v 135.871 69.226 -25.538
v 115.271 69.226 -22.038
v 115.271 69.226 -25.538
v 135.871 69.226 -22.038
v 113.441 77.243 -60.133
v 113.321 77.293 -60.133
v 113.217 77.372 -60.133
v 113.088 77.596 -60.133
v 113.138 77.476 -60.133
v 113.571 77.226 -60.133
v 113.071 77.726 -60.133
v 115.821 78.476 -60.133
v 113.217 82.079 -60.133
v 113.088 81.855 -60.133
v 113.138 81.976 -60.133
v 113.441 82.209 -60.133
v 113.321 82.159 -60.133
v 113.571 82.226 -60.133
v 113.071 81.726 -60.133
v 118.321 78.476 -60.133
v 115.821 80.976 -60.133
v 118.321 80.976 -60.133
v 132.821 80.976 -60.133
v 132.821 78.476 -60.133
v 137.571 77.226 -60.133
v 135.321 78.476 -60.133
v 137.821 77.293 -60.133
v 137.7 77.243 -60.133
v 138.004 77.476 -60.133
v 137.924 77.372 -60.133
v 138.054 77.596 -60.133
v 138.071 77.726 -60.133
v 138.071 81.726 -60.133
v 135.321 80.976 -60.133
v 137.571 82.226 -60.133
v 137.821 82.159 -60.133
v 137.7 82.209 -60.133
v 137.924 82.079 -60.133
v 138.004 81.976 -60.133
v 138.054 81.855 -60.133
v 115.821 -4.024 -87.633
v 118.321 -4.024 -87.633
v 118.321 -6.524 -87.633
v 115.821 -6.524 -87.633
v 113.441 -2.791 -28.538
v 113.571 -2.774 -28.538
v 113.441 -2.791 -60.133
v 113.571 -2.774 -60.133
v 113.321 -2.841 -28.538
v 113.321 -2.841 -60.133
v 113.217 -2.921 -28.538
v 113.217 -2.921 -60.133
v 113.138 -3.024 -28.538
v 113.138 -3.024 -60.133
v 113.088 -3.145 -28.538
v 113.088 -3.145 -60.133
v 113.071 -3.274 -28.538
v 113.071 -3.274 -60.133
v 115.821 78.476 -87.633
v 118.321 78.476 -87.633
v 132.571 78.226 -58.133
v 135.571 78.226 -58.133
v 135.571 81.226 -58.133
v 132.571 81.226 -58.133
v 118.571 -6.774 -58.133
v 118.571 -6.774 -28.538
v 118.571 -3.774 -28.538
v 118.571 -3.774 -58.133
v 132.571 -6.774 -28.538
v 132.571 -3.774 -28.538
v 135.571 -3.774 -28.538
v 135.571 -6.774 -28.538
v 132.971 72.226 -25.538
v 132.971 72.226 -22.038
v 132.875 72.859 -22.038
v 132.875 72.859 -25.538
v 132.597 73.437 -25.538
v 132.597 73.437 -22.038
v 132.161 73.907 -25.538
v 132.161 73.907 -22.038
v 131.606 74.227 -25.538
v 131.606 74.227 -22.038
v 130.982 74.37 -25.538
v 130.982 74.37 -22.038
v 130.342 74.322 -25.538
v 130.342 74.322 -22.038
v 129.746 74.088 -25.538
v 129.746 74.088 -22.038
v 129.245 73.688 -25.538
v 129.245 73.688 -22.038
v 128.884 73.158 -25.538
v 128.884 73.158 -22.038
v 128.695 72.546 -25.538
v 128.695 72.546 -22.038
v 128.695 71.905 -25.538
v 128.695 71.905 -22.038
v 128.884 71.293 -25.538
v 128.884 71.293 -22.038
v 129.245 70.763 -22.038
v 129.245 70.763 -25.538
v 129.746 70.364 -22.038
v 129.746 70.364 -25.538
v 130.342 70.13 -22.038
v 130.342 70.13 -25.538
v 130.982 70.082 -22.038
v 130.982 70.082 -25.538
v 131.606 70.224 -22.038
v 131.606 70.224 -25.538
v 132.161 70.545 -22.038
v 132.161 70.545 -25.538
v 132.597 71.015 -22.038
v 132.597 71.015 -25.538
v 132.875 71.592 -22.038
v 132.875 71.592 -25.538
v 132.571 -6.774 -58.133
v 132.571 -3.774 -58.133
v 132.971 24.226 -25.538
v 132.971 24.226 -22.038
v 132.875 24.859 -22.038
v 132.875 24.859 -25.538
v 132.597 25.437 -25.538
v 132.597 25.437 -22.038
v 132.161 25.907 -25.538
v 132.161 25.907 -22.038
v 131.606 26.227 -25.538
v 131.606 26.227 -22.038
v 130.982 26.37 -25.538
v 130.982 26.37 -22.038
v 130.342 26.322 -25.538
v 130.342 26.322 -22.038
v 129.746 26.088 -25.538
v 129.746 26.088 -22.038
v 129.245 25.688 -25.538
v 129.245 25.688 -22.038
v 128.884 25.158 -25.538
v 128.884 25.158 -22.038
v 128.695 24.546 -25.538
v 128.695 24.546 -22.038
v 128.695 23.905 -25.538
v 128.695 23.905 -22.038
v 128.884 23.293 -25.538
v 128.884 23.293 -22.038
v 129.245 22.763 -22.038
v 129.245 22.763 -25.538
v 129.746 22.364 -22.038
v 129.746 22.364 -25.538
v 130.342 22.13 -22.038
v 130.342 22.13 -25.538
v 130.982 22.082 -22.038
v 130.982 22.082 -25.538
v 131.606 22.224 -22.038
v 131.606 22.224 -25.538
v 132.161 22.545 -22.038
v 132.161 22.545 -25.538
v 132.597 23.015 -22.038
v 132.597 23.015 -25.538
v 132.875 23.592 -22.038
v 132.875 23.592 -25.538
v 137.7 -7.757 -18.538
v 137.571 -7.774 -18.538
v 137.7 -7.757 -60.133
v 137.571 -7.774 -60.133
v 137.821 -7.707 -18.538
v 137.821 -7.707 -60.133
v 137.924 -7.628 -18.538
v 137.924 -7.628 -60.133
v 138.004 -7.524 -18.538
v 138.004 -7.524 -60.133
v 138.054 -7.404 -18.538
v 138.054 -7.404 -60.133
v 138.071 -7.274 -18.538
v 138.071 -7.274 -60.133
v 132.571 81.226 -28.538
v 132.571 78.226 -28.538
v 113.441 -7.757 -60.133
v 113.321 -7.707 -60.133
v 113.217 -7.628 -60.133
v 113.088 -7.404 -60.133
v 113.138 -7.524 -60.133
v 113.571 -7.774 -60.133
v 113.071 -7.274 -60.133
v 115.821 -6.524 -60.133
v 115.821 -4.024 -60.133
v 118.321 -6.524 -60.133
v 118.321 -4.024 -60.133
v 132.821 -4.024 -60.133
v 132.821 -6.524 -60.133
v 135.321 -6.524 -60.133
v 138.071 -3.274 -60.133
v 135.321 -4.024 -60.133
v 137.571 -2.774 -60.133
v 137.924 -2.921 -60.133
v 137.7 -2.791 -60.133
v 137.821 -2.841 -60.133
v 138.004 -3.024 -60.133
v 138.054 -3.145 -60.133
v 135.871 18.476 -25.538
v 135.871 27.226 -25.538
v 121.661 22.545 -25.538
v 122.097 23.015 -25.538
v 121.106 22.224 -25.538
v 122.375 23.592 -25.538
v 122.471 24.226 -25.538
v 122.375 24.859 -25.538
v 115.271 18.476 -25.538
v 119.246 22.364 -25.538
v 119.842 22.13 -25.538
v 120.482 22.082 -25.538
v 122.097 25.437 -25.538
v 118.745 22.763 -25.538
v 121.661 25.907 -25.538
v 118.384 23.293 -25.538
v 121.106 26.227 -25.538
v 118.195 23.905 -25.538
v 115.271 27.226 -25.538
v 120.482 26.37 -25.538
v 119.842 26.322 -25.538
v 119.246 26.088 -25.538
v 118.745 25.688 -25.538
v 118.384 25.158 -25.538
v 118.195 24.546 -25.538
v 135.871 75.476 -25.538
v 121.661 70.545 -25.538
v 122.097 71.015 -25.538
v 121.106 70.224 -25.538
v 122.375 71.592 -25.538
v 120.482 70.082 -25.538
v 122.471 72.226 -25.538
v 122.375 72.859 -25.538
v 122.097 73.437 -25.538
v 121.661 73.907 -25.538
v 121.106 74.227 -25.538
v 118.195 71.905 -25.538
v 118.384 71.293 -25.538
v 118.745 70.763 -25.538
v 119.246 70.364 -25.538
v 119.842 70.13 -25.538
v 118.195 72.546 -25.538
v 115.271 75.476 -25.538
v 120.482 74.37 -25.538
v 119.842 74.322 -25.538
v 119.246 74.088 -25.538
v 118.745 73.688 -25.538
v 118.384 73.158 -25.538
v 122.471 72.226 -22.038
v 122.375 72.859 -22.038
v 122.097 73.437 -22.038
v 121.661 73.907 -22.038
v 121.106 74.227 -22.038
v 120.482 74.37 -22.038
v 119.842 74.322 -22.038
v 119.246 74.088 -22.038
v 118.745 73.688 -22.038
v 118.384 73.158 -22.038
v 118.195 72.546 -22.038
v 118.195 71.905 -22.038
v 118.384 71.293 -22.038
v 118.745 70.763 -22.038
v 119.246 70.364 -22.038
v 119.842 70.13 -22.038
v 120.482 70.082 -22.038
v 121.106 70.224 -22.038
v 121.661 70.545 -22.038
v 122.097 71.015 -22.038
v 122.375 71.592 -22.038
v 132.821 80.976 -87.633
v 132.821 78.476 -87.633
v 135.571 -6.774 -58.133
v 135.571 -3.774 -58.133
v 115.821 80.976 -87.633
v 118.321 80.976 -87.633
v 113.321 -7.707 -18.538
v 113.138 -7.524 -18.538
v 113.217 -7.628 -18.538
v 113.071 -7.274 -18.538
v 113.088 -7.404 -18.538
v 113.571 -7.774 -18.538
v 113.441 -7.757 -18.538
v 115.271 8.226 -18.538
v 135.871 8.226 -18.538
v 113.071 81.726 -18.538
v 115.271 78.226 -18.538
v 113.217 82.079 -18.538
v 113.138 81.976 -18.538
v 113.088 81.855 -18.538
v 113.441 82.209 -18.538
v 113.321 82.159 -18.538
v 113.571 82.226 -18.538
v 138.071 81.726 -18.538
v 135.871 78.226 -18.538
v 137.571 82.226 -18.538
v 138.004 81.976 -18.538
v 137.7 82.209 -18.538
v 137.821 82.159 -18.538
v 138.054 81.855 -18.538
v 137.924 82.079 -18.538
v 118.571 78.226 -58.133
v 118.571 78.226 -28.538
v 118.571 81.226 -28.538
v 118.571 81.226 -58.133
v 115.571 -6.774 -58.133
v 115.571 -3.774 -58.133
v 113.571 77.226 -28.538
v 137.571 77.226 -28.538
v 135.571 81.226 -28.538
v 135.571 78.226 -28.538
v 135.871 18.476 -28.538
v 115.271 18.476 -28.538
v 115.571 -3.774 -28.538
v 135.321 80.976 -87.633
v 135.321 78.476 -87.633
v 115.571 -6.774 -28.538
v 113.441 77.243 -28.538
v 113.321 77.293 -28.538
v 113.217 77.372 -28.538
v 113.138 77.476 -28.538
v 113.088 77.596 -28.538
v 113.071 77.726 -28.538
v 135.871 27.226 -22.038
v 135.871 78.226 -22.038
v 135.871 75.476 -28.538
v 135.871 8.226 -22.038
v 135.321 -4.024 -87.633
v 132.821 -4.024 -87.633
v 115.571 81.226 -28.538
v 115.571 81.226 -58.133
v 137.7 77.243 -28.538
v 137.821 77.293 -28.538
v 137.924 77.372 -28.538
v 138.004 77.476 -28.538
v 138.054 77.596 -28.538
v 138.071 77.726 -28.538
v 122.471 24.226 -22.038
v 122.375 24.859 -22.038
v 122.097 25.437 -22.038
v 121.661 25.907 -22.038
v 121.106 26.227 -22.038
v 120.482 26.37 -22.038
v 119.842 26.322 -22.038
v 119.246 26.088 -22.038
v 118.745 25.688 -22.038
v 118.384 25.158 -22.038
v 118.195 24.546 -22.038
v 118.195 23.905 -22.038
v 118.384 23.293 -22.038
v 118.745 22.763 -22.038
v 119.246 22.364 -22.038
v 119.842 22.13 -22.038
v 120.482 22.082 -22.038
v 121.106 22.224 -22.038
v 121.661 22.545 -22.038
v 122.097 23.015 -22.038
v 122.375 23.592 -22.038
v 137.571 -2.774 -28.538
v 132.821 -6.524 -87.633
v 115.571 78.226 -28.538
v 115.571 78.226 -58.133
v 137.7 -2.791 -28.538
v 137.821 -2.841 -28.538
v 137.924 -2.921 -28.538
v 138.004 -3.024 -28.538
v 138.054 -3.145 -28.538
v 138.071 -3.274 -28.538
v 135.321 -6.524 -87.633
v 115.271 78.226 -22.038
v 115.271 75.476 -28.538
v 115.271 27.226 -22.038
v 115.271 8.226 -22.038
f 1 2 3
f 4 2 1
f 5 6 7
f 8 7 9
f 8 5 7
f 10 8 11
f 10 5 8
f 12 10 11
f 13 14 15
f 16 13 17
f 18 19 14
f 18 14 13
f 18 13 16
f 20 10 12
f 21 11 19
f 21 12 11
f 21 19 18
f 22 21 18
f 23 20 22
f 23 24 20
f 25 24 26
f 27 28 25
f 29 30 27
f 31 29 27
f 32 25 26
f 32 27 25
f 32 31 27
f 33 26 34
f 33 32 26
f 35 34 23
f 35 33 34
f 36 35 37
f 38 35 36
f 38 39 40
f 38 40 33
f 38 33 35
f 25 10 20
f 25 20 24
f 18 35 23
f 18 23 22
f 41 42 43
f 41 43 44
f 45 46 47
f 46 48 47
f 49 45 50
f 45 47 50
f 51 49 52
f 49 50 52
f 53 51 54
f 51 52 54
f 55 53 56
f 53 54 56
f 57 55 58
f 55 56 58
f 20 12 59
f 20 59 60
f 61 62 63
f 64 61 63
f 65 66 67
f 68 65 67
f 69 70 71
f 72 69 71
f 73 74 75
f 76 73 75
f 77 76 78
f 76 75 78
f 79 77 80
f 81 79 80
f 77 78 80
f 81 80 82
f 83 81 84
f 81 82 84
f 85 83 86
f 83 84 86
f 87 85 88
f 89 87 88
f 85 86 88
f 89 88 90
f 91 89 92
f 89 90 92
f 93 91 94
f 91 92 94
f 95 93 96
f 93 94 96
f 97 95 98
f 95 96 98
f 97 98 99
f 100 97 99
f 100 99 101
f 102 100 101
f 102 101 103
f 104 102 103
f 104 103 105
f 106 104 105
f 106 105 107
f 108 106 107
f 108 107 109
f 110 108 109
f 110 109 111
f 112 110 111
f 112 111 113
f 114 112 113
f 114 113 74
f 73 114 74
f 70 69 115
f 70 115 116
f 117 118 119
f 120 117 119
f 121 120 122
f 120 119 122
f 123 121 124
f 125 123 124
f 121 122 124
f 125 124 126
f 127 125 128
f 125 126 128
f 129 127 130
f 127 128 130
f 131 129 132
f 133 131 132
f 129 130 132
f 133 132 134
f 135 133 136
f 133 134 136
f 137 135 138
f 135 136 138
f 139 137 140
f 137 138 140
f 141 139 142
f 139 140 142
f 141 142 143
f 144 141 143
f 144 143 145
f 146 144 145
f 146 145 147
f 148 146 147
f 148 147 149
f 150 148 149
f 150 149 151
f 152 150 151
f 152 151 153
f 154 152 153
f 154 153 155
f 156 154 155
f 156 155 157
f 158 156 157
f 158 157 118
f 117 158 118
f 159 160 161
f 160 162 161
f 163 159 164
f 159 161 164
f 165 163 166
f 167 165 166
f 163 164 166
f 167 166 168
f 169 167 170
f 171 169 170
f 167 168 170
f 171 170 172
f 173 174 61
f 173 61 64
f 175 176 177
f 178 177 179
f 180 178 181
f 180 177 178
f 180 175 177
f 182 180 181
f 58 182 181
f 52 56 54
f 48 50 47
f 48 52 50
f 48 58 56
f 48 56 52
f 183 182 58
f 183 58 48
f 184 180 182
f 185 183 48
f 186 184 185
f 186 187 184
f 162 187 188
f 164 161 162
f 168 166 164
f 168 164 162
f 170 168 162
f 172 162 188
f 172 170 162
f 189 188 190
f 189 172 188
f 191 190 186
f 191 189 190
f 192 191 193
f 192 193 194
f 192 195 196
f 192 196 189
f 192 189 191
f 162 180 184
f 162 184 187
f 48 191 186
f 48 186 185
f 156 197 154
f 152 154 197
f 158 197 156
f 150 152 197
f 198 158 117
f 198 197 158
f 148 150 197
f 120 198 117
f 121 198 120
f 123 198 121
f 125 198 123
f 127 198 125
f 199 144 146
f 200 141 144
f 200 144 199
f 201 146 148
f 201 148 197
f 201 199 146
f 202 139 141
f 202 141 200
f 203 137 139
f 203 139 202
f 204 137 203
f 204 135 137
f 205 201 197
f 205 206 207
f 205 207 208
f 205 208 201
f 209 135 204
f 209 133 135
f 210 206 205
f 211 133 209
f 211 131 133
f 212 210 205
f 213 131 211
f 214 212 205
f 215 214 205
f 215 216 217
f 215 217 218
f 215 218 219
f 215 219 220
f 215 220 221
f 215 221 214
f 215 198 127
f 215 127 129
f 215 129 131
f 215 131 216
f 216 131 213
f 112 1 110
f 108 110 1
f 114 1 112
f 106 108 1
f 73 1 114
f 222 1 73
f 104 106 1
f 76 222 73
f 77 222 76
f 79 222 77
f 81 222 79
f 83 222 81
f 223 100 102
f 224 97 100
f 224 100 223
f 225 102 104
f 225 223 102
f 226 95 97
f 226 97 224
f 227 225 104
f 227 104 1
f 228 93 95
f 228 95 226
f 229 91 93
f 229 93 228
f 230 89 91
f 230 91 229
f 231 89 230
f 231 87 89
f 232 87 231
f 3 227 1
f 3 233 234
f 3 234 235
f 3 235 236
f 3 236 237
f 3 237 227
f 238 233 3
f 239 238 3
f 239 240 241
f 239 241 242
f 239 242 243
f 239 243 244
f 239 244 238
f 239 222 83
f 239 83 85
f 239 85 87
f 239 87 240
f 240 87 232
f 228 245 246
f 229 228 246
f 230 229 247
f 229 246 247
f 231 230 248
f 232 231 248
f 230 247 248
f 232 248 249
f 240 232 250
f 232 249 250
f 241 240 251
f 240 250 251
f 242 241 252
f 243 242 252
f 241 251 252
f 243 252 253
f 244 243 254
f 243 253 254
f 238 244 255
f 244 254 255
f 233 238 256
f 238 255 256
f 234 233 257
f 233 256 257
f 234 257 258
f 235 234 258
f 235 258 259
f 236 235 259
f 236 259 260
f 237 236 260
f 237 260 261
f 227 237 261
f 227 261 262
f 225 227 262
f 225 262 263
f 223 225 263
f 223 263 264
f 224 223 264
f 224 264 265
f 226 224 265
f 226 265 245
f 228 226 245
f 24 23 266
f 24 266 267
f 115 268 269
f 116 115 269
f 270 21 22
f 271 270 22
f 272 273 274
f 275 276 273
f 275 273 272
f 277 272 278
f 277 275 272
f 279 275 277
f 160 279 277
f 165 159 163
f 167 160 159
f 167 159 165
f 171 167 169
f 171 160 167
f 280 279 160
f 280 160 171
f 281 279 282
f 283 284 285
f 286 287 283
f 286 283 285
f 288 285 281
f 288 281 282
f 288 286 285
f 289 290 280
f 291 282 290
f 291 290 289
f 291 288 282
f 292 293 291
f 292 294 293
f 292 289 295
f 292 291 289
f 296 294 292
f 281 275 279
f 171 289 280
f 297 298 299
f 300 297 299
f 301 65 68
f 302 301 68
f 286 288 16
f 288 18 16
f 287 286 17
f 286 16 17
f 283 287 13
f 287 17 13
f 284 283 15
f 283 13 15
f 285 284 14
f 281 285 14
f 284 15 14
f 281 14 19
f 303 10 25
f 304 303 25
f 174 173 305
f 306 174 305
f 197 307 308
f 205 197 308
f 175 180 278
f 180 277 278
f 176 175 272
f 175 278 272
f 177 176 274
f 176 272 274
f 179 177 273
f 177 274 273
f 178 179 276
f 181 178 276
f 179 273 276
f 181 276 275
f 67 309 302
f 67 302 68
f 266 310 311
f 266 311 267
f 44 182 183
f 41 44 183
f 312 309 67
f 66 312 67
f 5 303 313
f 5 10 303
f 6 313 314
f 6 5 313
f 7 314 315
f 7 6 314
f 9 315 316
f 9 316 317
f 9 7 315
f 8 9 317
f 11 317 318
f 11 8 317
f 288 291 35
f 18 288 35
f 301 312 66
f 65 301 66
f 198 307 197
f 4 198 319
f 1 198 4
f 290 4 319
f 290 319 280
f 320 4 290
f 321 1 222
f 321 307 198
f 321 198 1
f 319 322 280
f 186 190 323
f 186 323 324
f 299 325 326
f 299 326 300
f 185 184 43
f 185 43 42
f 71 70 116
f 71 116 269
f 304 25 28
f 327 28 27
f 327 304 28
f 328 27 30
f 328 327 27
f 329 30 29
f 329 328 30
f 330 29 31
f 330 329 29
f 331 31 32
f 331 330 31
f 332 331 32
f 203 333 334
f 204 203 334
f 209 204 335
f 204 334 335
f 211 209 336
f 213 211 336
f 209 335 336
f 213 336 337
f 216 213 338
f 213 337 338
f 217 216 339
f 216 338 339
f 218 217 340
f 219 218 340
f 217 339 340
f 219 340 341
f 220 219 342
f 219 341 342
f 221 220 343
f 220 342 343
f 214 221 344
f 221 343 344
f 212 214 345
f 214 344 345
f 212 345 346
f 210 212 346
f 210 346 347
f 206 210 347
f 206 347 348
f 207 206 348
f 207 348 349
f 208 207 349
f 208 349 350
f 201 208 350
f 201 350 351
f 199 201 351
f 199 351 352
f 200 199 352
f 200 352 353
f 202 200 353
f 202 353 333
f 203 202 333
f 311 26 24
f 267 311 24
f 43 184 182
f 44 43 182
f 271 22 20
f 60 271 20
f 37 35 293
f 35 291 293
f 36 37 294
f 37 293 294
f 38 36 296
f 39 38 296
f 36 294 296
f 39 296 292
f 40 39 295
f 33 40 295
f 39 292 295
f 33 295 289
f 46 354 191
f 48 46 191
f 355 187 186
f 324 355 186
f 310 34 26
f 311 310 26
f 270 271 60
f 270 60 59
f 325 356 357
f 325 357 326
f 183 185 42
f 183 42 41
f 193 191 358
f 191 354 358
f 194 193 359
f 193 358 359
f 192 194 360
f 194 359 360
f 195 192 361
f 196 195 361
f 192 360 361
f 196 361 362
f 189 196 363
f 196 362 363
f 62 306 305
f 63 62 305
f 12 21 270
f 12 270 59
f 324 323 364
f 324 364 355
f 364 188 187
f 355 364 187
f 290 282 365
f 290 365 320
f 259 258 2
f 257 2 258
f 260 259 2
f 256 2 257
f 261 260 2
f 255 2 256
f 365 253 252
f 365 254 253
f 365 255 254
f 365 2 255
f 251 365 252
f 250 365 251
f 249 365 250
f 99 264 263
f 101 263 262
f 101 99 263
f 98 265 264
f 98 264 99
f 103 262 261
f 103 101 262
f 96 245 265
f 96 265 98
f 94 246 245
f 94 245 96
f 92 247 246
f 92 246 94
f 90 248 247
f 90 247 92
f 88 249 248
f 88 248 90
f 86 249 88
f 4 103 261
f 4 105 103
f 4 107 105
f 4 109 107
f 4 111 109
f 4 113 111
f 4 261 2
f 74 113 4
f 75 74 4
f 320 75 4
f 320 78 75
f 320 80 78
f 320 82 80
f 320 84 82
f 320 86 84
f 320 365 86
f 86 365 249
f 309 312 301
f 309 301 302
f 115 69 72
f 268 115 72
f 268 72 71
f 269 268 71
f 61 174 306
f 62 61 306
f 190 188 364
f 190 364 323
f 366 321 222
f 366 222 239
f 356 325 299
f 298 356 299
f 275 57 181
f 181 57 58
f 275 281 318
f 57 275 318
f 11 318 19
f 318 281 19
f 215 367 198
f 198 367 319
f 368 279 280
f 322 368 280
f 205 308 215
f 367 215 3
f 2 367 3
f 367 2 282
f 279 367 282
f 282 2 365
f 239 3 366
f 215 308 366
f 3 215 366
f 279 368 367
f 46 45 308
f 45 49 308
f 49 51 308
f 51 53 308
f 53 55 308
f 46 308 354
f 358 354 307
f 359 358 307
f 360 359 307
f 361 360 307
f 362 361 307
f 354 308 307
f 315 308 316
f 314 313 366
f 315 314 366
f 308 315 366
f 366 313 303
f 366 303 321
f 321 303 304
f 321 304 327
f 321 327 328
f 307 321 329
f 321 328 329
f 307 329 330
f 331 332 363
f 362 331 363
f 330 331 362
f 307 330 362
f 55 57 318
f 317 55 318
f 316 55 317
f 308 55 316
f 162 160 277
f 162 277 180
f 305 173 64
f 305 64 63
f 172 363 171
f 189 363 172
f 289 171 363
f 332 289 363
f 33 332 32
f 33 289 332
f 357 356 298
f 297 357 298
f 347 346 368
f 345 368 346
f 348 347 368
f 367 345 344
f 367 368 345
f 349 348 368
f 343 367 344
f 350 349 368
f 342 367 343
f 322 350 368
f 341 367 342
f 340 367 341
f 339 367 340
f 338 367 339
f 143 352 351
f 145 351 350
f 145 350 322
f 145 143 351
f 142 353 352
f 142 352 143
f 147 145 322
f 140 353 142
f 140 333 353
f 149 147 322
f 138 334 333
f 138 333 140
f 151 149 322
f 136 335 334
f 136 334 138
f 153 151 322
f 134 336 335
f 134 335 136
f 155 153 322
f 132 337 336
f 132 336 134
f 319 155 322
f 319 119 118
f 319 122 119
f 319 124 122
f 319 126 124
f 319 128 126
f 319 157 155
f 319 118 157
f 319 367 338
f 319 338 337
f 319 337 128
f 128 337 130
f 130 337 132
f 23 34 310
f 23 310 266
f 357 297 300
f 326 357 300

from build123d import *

# Parameters (mm, degrees)
BOSS_EXTRUDE1_OUTLINE_W   = 25
BOSS_EXTRUDE1_OUTLINE_H   = 5
BOSS_EXTRUDE1_OUTLINE_W_2 = 3
BOSS_EXTRUDE1_OUTLINE_H_2 = 3
BOSS_EXTRUDE1_DEPTH       = 31.595565731
SKETCH4_W                 = 25
SKETCH4_H                 = 90
BOSS_EXTRUDE3_DEPTH       = 10
SKETCH6_R                 = 2.15
CUT_EXTRUDE2_DEPTH        = 10
SKETCH7_W                 = 20.6
SKETCH7_H                 = 42
CUT_EXTRUDE3_DEPTH        = 10
SKETCH9_W                 = 2
SKETCH9_H                 = 90
CUT_EXTRUDE4_DEPTH        = 105.890618955
SKETCH10_W                = 2
SKETCH10_H                = 90
BOSS_EXTRUDE4_DEPTH       = 25
SKETCH8_W                 = 2.5
SKETCH8_H                 = 2.5
BOSS_EXTRUDE5_DEPTH       = 27.5
SKETCH11_W                = 3
SKETCH11_H                = 80
CUT_EXTRUDE5_DEPTH        = 123.742049491
SKETCH13_W                = 20.6
SKETCH13_H                = 57
CUT_EXTRUDE6_DEPTH        = 3
FILLET1_R                 = 0.5
SKETCH14_W                = 20.6
SKETCH14_H                = 70
CUT_EXTRUDE7_DEPTH        = 3.5


# Read off the part's stored shape, not the designer's step: Boss-Extrude1
with BuildPart() as part:
    # Boss-Extrude1 outline → Boss-Extrude1 (new body)
    # profile 1 of 2: a face of its own
    with BuildSketch(Plane.XY.offset(-60.133068515)):
        with Locations((125.570893714, 79.725640866)):
            Rectangle(BOSS_EXTRUDE1_OUTLINE_W, BOSS_EXTRUDE1_OUTLINE_H)
        with Locations((117.070893714, 79.725640866)):
            Rectangle(BOSS_EXTRUDE1_OUTLINE_W_2, BOSS_EXTRUDE1_OUTLINE_H_2, mode=Mode.SUBTRACT)
        with Locations((134.070893714, 79.725640866)):
            Rectangle(BOSS_EXTRUDE1_OUTLINE_W_2, BOSS_EXTRUDE1_OUTLINE_H_2, mode=Mode.SUBTRACT)
    # profile 2 of 2: a face of its own
    with BuildSketch(Plane.XY.offset(-60.133068515)):
        with Locations((125.570893714, -5.274359134)):
            Rectangle(BOSS_EXTRUDE1_OUTLINE_W, BOSS_EXTRUDE1_OUTLINE_H)
        with Locations((117.070893714, -5.274359134)):
            Rectangle(BOSS_EXTRUDE1_OUTLINE_W_2, BOSS_EXTRUDE1_OUTLINE_H_2, mode=Mode.SUBTRACT)
        with Locations((134.070893714, -5.274359134)):
            Rectangle(BOSS_EXTRUDE1_OUTLINE_W_2, BOSS_EXTRUDE1_OUTLINE_H_2, mode=Mode.SUBTRACT)
    extrude(amount=BOSS_EXTRUDE1_DEPTH)

    # Sketch4 → Boss-Extrude3 (add)
    with BuildSketch(Plane.XY.offset(-28.537502783)):
        with Locations((125.570893714, 37.225640866)):
            Rectangle(SKETCH4_W, SKETCH4_H)
    extrude(amount=BOSS_EXTRUDE3_DEPTH)

    # Sketch6 → Cut-Extrude2 (cut)
    with BuildSketch(Plane.XY.offset(-18.537502783)):
        with Locations((130.820893714, 24.225640866)):
            Circle(SKETCH6_R)
        with Locations((120.320893714, 24.225640866)):
            Circle(SKETCH6_R)
        with Locations((130.820893714, 72.225640866)):
            Circle(SKETCH6_R)
        with Locations((120.320893714, 72.225640866)):
            Circle(SKETCH6_R)
        with Locations((130.820893714, 72.225640866)):
            Circle(SKETCH6_R)
    extrude(amount=-CUT_EXTRUDE2_DEPTH, mode=Mode.SUBTRACT)

    # Sketch7 → Cut-Extrude3 (cut)
    with BuildSketch(Plane.XY.offset(-18.537502783)):
        with Locations((125.570893714, 48.225640866)):
            Rectangle(SKETCH7_W, SKETCH7_H)
    extrude(amount=-CUT_EXTRUDE3_DEPTH, mode=Mode.SUBTRACT)

    # Sketch9 → Cut-Extrude4 (cut, through all)
    with BuildSketch(Plane(origin=(138.070893714, 0, 0), x_dir=(0, 0, -1), z_dir=(1, 0, 0))):
        with Locations((59.133068515, 37.225640866)):
            Rectangle(SKETCH9_W, SKETCH9_H)
    extrude(amount=-CUT_EXTRUDE4_DEPTH, mode=Mode.SUBTRACT)

    # Sketch10 → Boss-Extrude4 (add)
    with BuildSketch(Plane(origin=(138.070893714, 0, 0), x_dir=(0, 0, -1), z_dir=(1, 0, 0))):
        with Locations((59.133068515, 37.225640866)):
            Rectangle(SKETCH10_W, SKETCH10_H)
    extrude(amount=-BOSS_EXTRUDE4_DEPTH)

    # Sketch8 → Boss-Extrude5 (add)
    with BuildSketch(Plane(origin=(0, 0, -60.133068515), x_dir=(-1, 0, 0), z_dir=(0, 0, -1))):
        Polygon((-135.320893714, 80.975640866), (-135.320893714, 78.475640866), (-132.820893714, 78.475640866), align=None)
        Polygon((-132.820893714, 80.975640866), (-132.820893714, 78.475640866), (-135.320893714, 80.975640866), align=None)
        Polygon((-118.320893714, 80.975640866), (-118.320893714, 78.475640866), (-115.820893714, 80.975640866), align=None)
        Polygon((-118.320893714, 78.475640866), (-115.820893714, 80.975640866), (-115.820893714, 78.475640866), align=None)
        with Locations((-117.070893714, -5.274359134)):
            Rectangle(SKETCH8_W, SKETCH8_H)
        with Locations((-134.070893714, -5.274359134)):
            Rectangle(SKETCH8_W, SKETCH8_H)
    extrude(amount=BOSS_EXTRUDE5_DEPTH)

    # Sketch11 → Cut-Extrude5 (cut, through all)
    with BuildSketch(Plane(origin=(138.070893714, 0, 0), x_dir=(0, 0, -1), z_dir=(1, 0, 0))):
        with Locations((59.633068515, 37.225640866)):
            Rectangle(SKETCH11_W, SKETCH11_H)
    extrude(amount=-CUT_EXTRUDE5_DEPTH, mode=Mode.SUBTRACT)

    # Sketch13 → Cut-Extrude6 (cut)
    with BuildSketch(Plane(origin=(0, 0, -28.537502783), x_dir=(-1, 0, 0), z_dir=(0, 0, -1))):
        with Locations((-125.570893714, 46.975640866)):
            Rectangle(SKETCH13_W, SKETCH13_H)
    extrude(amount=-CUT_EXTRUDE6_DEPTH, mode=Mode.SUBTRACT)

    # Fillet1
    fillet1_edges = [part.edges().sort_by_distance(p)[0] for p in [
        (113.070893714, -7.774359134, -38.335285649),
        (138.070893714, -7.774359134, -43.335285649),
        (138.070893714, 77.225640866, -43.335285649),
        (138.070893714, 82.225640866, -39.335285649),
        (113.070893714, 82.225640866, -43.335285649),
        (138.070893714, -2.774359134, -43.335285649),
        (113.070893714, 77.225640866, -43.335285649),
        (113.070893714, -2.774359134, -43.335285649),
    ]]
    fillet(fillet1_edges, radius=FILLET1_R)

    # Sketch14 → Cut-Extrude7 (cut)
    with BuildSketch(Plane.XY.offset(-18.537502783)):
        with Locations((125.570893714, 43.225640866)):
            Rectangle(SKETCH14_W, SKETCH14_H)
    extrude(amount=-CUT_EXTRUDE7_DEPTH, mode=Mode.SUBTRACT)


solid = part.part
